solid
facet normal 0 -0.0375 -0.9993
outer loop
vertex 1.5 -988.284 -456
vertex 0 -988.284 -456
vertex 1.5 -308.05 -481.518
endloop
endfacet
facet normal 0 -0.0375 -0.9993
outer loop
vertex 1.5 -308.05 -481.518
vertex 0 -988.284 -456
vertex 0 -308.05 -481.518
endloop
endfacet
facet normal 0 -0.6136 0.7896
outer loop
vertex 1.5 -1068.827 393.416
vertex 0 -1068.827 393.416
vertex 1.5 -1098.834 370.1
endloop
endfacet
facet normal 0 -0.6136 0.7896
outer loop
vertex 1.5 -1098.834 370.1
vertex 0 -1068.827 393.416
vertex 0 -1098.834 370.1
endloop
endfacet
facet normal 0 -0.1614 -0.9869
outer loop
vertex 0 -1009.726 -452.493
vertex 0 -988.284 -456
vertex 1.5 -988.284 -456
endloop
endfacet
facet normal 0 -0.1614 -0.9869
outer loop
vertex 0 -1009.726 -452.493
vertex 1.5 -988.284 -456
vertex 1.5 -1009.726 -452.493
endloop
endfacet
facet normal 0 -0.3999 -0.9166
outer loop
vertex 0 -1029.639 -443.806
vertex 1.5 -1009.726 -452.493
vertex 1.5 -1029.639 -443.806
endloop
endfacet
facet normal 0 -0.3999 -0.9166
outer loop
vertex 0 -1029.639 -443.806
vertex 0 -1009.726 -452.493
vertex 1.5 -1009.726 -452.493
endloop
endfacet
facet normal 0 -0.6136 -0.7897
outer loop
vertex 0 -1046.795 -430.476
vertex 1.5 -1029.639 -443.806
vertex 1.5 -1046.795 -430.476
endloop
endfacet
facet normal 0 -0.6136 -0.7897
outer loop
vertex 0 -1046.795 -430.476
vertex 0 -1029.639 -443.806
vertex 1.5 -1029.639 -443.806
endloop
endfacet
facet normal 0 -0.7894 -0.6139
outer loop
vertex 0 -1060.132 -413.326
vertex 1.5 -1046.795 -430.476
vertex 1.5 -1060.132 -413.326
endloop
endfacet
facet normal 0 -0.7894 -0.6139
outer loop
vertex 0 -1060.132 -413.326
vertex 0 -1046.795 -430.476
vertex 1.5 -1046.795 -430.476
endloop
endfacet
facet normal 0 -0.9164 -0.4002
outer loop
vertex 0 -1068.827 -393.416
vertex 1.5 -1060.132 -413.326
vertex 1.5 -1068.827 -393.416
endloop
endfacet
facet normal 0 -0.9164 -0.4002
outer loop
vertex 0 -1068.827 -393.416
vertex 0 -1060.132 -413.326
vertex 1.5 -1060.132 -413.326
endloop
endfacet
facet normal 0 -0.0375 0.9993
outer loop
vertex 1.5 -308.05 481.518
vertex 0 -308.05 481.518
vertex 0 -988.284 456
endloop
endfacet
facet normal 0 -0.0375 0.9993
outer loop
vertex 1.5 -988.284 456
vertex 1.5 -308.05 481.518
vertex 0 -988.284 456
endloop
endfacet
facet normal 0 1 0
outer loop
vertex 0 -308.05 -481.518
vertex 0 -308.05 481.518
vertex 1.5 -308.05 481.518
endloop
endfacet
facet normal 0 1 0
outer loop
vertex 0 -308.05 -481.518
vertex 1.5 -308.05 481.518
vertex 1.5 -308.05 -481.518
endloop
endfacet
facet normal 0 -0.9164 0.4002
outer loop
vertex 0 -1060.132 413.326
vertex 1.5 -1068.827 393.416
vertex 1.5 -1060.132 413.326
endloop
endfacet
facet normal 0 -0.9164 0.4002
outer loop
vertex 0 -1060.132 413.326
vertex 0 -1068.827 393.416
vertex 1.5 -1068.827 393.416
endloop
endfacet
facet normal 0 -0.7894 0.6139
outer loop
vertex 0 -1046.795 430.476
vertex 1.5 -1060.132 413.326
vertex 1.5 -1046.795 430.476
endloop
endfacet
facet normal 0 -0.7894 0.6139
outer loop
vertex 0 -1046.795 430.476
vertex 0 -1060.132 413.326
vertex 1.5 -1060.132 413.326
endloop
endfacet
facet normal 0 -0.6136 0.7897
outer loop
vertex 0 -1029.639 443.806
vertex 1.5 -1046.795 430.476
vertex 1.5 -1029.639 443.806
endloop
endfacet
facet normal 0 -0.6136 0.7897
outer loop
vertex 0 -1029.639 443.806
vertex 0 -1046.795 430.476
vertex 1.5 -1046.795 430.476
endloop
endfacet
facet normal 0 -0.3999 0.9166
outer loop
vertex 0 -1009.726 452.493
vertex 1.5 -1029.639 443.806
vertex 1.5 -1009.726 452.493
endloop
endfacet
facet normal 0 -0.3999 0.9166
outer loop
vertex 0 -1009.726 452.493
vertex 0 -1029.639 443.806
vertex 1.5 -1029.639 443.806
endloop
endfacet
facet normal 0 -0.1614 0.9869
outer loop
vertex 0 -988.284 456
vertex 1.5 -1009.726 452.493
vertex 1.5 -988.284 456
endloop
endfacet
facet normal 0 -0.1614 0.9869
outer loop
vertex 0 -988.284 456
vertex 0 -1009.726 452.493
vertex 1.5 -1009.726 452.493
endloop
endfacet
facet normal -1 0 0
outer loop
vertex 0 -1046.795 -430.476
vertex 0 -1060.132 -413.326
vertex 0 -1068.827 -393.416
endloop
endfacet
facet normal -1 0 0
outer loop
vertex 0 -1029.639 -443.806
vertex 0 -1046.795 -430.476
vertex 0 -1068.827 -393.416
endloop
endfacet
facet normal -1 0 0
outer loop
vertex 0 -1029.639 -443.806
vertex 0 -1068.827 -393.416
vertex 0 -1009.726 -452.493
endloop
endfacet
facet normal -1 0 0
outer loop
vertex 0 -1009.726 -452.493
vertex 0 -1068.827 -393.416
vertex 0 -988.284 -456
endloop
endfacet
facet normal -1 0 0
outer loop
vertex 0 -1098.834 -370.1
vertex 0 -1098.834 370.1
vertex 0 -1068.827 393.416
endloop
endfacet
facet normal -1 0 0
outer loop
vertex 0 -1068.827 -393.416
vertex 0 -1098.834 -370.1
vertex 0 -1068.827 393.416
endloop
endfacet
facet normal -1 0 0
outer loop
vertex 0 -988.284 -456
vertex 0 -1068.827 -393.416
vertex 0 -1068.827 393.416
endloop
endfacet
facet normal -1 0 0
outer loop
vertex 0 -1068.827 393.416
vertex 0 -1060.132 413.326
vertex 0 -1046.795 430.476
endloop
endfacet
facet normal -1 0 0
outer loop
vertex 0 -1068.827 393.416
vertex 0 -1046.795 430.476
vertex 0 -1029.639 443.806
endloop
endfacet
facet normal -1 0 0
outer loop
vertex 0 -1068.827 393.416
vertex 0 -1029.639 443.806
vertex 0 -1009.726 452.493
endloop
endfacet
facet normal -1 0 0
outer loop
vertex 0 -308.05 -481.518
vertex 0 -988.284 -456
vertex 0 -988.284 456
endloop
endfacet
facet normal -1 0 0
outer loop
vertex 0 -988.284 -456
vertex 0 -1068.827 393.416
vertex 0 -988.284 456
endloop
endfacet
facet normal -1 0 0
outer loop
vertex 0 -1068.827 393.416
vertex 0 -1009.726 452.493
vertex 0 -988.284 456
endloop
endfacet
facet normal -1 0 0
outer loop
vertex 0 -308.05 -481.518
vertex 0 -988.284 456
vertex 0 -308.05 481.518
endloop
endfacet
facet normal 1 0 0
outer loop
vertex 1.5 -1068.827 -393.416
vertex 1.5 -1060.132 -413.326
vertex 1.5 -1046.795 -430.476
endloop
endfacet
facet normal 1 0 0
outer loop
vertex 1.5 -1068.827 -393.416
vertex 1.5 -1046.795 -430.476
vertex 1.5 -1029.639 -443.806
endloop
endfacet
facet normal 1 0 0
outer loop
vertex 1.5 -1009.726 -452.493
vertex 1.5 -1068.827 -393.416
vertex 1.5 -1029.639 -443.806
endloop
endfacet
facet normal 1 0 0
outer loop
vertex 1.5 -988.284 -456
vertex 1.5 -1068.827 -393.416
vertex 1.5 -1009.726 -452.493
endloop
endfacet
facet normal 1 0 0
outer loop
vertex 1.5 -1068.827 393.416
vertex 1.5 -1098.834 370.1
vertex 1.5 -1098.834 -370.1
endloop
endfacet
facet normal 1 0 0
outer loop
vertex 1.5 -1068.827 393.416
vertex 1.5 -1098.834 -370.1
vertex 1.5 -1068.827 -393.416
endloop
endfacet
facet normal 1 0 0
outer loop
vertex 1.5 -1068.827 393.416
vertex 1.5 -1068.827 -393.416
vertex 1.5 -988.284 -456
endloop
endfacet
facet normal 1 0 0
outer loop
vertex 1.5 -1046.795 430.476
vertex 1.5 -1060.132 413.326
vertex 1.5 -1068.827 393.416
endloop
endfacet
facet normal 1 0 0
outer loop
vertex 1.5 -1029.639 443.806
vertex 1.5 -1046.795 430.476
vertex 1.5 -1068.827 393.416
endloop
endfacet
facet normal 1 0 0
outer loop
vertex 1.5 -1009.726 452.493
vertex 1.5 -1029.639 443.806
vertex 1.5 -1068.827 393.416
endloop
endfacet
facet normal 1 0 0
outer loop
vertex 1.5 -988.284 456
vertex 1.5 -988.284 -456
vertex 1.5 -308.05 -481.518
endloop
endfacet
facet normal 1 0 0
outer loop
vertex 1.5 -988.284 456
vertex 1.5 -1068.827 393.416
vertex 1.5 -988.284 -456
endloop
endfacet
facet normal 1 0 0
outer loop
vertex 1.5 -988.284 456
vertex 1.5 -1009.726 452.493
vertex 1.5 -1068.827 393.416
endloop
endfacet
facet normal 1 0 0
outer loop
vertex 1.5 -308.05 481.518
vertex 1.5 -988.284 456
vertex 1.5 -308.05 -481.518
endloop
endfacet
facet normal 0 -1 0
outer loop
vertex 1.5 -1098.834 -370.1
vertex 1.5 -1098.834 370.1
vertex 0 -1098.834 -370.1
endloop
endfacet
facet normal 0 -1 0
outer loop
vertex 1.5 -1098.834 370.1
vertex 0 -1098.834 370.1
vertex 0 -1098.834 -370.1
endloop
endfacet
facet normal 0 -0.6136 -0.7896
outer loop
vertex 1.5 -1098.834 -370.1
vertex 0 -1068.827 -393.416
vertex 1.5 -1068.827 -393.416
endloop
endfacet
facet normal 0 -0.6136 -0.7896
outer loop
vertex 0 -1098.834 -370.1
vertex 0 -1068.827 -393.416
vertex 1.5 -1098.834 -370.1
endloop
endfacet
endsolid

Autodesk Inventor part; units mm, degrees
ref_plane "YZ Plane" through (0, 0, 0) normal (1, 0, 0) x (0, 1, 0)
ref_plane "XZ Plane" through (0, 0, 0) normal (0, 1, 0) x (-1, 0, 0)
ref_plane "XY Plane" through (0, 0, 0) normal (0, 0, 1) x (1, 0, 0)
sketch "Sketch1" plane through (0, 0, 0) normal (1, 0, 0) x (0, 1, 0)
  line L0 (-41.95, 491.5) -> (41.95, 491.5)
  line L1 (41.95, 491.5) -> (41.95, -491.5)
  line L2 (41.95, -491.5) -> (-41.95, -491.5)
  line L3 (-41.95, -491.5) -> (-41.95, 491.5)
  line L4 (-41.95, 491.5) -> (41.95, -491.5) construction
  line L5 (41.95, 491.5) -> (-41.95, -491.5) construction
  line L6 (-41.95, 491.5) -> (-988.2844, 456)
  line L7 (-988.2844, 456) -> (-988.2844, -456)
  line L8 (-988.2844, -456) -> (-41.95, -491.5)
  line L9 (-308.05, 481.5177) -> (-308.05, -481.5177)
  line L10 (-988.2844, 456) -> (-1098.8336, 370.0997)
  arc A0 (-988.2844, 456) -> (-1068.8274, 393.4155) centre (-985.0081, 368.664) ccw
  line L11 (-988.2844, 0) -> (-1170.4564, 0)
  line L12 (-1098.8336, 370.0997) -> (-1098.8336, 0)
  line L13 (-988.2844, -456) -> (-1098.8336, -370.0997)
  arc A1 (-1068.8274, -393.4155) -> (-988.2844, -456) centre (-985.0081, -368.664) ccw
  line L14 (-1098.8336, -370.0997) -> (-1098.8336, 0)
  point P0 (0, 0)
  point P1 (-41.95, 0)
  dimension "d0" = 983
  dimension "d1" = 83.9
  dimension "d3" = 912
  dimension "d4" = 947
  dimension "d5" = 350
  dimension "d9" = 35.7
  dimension "d10" = 102
  dimension "d11" = 38
extrude "Plate2" add sketch "Sketch1" along normal blind 1.5 contours L9 L8 L7 L6
sheet face with bend "Face3" sketch "Sketch1" thickness 1.5 toward (1, 0, 0) bend radius 1.5 contours L7 L11 L12 L10 | L10 A0 | L13 L14 L11 L7 | A1 L13
bend "Bend1"
equation "\"d7\" = Thickness"
equation "\"d12\" = BendRadius"
equation "\"d13\" = BendReliefWidth"
equation "\"d15\" = MinimumRemnant"
equation "\"d14\" = BendReliefDepth"
equation "\"d16\" = TransitionRadius"
equation "\"BendRadius\" = Thickness"
equation "\"BendReliefWidth\" = Thickness"
equation "\"BendReliefDepth\" = 0.5 * Thickness"
equation "\"CornerReliefSize\" = 4 * Thickness"
equation "\"MinimumRemnant\" = 2 * Thickness"
equation "\"TransitionRadius\" = BendRadius"
equation "\"JacobiRadiusSize\" = BendRadius"
equation "\"GapSize\" = Thickness"
equation "\"Thickness\" = 1.5"
properties part number "CHAPA_2" material "Steel, Mild, Welded"
